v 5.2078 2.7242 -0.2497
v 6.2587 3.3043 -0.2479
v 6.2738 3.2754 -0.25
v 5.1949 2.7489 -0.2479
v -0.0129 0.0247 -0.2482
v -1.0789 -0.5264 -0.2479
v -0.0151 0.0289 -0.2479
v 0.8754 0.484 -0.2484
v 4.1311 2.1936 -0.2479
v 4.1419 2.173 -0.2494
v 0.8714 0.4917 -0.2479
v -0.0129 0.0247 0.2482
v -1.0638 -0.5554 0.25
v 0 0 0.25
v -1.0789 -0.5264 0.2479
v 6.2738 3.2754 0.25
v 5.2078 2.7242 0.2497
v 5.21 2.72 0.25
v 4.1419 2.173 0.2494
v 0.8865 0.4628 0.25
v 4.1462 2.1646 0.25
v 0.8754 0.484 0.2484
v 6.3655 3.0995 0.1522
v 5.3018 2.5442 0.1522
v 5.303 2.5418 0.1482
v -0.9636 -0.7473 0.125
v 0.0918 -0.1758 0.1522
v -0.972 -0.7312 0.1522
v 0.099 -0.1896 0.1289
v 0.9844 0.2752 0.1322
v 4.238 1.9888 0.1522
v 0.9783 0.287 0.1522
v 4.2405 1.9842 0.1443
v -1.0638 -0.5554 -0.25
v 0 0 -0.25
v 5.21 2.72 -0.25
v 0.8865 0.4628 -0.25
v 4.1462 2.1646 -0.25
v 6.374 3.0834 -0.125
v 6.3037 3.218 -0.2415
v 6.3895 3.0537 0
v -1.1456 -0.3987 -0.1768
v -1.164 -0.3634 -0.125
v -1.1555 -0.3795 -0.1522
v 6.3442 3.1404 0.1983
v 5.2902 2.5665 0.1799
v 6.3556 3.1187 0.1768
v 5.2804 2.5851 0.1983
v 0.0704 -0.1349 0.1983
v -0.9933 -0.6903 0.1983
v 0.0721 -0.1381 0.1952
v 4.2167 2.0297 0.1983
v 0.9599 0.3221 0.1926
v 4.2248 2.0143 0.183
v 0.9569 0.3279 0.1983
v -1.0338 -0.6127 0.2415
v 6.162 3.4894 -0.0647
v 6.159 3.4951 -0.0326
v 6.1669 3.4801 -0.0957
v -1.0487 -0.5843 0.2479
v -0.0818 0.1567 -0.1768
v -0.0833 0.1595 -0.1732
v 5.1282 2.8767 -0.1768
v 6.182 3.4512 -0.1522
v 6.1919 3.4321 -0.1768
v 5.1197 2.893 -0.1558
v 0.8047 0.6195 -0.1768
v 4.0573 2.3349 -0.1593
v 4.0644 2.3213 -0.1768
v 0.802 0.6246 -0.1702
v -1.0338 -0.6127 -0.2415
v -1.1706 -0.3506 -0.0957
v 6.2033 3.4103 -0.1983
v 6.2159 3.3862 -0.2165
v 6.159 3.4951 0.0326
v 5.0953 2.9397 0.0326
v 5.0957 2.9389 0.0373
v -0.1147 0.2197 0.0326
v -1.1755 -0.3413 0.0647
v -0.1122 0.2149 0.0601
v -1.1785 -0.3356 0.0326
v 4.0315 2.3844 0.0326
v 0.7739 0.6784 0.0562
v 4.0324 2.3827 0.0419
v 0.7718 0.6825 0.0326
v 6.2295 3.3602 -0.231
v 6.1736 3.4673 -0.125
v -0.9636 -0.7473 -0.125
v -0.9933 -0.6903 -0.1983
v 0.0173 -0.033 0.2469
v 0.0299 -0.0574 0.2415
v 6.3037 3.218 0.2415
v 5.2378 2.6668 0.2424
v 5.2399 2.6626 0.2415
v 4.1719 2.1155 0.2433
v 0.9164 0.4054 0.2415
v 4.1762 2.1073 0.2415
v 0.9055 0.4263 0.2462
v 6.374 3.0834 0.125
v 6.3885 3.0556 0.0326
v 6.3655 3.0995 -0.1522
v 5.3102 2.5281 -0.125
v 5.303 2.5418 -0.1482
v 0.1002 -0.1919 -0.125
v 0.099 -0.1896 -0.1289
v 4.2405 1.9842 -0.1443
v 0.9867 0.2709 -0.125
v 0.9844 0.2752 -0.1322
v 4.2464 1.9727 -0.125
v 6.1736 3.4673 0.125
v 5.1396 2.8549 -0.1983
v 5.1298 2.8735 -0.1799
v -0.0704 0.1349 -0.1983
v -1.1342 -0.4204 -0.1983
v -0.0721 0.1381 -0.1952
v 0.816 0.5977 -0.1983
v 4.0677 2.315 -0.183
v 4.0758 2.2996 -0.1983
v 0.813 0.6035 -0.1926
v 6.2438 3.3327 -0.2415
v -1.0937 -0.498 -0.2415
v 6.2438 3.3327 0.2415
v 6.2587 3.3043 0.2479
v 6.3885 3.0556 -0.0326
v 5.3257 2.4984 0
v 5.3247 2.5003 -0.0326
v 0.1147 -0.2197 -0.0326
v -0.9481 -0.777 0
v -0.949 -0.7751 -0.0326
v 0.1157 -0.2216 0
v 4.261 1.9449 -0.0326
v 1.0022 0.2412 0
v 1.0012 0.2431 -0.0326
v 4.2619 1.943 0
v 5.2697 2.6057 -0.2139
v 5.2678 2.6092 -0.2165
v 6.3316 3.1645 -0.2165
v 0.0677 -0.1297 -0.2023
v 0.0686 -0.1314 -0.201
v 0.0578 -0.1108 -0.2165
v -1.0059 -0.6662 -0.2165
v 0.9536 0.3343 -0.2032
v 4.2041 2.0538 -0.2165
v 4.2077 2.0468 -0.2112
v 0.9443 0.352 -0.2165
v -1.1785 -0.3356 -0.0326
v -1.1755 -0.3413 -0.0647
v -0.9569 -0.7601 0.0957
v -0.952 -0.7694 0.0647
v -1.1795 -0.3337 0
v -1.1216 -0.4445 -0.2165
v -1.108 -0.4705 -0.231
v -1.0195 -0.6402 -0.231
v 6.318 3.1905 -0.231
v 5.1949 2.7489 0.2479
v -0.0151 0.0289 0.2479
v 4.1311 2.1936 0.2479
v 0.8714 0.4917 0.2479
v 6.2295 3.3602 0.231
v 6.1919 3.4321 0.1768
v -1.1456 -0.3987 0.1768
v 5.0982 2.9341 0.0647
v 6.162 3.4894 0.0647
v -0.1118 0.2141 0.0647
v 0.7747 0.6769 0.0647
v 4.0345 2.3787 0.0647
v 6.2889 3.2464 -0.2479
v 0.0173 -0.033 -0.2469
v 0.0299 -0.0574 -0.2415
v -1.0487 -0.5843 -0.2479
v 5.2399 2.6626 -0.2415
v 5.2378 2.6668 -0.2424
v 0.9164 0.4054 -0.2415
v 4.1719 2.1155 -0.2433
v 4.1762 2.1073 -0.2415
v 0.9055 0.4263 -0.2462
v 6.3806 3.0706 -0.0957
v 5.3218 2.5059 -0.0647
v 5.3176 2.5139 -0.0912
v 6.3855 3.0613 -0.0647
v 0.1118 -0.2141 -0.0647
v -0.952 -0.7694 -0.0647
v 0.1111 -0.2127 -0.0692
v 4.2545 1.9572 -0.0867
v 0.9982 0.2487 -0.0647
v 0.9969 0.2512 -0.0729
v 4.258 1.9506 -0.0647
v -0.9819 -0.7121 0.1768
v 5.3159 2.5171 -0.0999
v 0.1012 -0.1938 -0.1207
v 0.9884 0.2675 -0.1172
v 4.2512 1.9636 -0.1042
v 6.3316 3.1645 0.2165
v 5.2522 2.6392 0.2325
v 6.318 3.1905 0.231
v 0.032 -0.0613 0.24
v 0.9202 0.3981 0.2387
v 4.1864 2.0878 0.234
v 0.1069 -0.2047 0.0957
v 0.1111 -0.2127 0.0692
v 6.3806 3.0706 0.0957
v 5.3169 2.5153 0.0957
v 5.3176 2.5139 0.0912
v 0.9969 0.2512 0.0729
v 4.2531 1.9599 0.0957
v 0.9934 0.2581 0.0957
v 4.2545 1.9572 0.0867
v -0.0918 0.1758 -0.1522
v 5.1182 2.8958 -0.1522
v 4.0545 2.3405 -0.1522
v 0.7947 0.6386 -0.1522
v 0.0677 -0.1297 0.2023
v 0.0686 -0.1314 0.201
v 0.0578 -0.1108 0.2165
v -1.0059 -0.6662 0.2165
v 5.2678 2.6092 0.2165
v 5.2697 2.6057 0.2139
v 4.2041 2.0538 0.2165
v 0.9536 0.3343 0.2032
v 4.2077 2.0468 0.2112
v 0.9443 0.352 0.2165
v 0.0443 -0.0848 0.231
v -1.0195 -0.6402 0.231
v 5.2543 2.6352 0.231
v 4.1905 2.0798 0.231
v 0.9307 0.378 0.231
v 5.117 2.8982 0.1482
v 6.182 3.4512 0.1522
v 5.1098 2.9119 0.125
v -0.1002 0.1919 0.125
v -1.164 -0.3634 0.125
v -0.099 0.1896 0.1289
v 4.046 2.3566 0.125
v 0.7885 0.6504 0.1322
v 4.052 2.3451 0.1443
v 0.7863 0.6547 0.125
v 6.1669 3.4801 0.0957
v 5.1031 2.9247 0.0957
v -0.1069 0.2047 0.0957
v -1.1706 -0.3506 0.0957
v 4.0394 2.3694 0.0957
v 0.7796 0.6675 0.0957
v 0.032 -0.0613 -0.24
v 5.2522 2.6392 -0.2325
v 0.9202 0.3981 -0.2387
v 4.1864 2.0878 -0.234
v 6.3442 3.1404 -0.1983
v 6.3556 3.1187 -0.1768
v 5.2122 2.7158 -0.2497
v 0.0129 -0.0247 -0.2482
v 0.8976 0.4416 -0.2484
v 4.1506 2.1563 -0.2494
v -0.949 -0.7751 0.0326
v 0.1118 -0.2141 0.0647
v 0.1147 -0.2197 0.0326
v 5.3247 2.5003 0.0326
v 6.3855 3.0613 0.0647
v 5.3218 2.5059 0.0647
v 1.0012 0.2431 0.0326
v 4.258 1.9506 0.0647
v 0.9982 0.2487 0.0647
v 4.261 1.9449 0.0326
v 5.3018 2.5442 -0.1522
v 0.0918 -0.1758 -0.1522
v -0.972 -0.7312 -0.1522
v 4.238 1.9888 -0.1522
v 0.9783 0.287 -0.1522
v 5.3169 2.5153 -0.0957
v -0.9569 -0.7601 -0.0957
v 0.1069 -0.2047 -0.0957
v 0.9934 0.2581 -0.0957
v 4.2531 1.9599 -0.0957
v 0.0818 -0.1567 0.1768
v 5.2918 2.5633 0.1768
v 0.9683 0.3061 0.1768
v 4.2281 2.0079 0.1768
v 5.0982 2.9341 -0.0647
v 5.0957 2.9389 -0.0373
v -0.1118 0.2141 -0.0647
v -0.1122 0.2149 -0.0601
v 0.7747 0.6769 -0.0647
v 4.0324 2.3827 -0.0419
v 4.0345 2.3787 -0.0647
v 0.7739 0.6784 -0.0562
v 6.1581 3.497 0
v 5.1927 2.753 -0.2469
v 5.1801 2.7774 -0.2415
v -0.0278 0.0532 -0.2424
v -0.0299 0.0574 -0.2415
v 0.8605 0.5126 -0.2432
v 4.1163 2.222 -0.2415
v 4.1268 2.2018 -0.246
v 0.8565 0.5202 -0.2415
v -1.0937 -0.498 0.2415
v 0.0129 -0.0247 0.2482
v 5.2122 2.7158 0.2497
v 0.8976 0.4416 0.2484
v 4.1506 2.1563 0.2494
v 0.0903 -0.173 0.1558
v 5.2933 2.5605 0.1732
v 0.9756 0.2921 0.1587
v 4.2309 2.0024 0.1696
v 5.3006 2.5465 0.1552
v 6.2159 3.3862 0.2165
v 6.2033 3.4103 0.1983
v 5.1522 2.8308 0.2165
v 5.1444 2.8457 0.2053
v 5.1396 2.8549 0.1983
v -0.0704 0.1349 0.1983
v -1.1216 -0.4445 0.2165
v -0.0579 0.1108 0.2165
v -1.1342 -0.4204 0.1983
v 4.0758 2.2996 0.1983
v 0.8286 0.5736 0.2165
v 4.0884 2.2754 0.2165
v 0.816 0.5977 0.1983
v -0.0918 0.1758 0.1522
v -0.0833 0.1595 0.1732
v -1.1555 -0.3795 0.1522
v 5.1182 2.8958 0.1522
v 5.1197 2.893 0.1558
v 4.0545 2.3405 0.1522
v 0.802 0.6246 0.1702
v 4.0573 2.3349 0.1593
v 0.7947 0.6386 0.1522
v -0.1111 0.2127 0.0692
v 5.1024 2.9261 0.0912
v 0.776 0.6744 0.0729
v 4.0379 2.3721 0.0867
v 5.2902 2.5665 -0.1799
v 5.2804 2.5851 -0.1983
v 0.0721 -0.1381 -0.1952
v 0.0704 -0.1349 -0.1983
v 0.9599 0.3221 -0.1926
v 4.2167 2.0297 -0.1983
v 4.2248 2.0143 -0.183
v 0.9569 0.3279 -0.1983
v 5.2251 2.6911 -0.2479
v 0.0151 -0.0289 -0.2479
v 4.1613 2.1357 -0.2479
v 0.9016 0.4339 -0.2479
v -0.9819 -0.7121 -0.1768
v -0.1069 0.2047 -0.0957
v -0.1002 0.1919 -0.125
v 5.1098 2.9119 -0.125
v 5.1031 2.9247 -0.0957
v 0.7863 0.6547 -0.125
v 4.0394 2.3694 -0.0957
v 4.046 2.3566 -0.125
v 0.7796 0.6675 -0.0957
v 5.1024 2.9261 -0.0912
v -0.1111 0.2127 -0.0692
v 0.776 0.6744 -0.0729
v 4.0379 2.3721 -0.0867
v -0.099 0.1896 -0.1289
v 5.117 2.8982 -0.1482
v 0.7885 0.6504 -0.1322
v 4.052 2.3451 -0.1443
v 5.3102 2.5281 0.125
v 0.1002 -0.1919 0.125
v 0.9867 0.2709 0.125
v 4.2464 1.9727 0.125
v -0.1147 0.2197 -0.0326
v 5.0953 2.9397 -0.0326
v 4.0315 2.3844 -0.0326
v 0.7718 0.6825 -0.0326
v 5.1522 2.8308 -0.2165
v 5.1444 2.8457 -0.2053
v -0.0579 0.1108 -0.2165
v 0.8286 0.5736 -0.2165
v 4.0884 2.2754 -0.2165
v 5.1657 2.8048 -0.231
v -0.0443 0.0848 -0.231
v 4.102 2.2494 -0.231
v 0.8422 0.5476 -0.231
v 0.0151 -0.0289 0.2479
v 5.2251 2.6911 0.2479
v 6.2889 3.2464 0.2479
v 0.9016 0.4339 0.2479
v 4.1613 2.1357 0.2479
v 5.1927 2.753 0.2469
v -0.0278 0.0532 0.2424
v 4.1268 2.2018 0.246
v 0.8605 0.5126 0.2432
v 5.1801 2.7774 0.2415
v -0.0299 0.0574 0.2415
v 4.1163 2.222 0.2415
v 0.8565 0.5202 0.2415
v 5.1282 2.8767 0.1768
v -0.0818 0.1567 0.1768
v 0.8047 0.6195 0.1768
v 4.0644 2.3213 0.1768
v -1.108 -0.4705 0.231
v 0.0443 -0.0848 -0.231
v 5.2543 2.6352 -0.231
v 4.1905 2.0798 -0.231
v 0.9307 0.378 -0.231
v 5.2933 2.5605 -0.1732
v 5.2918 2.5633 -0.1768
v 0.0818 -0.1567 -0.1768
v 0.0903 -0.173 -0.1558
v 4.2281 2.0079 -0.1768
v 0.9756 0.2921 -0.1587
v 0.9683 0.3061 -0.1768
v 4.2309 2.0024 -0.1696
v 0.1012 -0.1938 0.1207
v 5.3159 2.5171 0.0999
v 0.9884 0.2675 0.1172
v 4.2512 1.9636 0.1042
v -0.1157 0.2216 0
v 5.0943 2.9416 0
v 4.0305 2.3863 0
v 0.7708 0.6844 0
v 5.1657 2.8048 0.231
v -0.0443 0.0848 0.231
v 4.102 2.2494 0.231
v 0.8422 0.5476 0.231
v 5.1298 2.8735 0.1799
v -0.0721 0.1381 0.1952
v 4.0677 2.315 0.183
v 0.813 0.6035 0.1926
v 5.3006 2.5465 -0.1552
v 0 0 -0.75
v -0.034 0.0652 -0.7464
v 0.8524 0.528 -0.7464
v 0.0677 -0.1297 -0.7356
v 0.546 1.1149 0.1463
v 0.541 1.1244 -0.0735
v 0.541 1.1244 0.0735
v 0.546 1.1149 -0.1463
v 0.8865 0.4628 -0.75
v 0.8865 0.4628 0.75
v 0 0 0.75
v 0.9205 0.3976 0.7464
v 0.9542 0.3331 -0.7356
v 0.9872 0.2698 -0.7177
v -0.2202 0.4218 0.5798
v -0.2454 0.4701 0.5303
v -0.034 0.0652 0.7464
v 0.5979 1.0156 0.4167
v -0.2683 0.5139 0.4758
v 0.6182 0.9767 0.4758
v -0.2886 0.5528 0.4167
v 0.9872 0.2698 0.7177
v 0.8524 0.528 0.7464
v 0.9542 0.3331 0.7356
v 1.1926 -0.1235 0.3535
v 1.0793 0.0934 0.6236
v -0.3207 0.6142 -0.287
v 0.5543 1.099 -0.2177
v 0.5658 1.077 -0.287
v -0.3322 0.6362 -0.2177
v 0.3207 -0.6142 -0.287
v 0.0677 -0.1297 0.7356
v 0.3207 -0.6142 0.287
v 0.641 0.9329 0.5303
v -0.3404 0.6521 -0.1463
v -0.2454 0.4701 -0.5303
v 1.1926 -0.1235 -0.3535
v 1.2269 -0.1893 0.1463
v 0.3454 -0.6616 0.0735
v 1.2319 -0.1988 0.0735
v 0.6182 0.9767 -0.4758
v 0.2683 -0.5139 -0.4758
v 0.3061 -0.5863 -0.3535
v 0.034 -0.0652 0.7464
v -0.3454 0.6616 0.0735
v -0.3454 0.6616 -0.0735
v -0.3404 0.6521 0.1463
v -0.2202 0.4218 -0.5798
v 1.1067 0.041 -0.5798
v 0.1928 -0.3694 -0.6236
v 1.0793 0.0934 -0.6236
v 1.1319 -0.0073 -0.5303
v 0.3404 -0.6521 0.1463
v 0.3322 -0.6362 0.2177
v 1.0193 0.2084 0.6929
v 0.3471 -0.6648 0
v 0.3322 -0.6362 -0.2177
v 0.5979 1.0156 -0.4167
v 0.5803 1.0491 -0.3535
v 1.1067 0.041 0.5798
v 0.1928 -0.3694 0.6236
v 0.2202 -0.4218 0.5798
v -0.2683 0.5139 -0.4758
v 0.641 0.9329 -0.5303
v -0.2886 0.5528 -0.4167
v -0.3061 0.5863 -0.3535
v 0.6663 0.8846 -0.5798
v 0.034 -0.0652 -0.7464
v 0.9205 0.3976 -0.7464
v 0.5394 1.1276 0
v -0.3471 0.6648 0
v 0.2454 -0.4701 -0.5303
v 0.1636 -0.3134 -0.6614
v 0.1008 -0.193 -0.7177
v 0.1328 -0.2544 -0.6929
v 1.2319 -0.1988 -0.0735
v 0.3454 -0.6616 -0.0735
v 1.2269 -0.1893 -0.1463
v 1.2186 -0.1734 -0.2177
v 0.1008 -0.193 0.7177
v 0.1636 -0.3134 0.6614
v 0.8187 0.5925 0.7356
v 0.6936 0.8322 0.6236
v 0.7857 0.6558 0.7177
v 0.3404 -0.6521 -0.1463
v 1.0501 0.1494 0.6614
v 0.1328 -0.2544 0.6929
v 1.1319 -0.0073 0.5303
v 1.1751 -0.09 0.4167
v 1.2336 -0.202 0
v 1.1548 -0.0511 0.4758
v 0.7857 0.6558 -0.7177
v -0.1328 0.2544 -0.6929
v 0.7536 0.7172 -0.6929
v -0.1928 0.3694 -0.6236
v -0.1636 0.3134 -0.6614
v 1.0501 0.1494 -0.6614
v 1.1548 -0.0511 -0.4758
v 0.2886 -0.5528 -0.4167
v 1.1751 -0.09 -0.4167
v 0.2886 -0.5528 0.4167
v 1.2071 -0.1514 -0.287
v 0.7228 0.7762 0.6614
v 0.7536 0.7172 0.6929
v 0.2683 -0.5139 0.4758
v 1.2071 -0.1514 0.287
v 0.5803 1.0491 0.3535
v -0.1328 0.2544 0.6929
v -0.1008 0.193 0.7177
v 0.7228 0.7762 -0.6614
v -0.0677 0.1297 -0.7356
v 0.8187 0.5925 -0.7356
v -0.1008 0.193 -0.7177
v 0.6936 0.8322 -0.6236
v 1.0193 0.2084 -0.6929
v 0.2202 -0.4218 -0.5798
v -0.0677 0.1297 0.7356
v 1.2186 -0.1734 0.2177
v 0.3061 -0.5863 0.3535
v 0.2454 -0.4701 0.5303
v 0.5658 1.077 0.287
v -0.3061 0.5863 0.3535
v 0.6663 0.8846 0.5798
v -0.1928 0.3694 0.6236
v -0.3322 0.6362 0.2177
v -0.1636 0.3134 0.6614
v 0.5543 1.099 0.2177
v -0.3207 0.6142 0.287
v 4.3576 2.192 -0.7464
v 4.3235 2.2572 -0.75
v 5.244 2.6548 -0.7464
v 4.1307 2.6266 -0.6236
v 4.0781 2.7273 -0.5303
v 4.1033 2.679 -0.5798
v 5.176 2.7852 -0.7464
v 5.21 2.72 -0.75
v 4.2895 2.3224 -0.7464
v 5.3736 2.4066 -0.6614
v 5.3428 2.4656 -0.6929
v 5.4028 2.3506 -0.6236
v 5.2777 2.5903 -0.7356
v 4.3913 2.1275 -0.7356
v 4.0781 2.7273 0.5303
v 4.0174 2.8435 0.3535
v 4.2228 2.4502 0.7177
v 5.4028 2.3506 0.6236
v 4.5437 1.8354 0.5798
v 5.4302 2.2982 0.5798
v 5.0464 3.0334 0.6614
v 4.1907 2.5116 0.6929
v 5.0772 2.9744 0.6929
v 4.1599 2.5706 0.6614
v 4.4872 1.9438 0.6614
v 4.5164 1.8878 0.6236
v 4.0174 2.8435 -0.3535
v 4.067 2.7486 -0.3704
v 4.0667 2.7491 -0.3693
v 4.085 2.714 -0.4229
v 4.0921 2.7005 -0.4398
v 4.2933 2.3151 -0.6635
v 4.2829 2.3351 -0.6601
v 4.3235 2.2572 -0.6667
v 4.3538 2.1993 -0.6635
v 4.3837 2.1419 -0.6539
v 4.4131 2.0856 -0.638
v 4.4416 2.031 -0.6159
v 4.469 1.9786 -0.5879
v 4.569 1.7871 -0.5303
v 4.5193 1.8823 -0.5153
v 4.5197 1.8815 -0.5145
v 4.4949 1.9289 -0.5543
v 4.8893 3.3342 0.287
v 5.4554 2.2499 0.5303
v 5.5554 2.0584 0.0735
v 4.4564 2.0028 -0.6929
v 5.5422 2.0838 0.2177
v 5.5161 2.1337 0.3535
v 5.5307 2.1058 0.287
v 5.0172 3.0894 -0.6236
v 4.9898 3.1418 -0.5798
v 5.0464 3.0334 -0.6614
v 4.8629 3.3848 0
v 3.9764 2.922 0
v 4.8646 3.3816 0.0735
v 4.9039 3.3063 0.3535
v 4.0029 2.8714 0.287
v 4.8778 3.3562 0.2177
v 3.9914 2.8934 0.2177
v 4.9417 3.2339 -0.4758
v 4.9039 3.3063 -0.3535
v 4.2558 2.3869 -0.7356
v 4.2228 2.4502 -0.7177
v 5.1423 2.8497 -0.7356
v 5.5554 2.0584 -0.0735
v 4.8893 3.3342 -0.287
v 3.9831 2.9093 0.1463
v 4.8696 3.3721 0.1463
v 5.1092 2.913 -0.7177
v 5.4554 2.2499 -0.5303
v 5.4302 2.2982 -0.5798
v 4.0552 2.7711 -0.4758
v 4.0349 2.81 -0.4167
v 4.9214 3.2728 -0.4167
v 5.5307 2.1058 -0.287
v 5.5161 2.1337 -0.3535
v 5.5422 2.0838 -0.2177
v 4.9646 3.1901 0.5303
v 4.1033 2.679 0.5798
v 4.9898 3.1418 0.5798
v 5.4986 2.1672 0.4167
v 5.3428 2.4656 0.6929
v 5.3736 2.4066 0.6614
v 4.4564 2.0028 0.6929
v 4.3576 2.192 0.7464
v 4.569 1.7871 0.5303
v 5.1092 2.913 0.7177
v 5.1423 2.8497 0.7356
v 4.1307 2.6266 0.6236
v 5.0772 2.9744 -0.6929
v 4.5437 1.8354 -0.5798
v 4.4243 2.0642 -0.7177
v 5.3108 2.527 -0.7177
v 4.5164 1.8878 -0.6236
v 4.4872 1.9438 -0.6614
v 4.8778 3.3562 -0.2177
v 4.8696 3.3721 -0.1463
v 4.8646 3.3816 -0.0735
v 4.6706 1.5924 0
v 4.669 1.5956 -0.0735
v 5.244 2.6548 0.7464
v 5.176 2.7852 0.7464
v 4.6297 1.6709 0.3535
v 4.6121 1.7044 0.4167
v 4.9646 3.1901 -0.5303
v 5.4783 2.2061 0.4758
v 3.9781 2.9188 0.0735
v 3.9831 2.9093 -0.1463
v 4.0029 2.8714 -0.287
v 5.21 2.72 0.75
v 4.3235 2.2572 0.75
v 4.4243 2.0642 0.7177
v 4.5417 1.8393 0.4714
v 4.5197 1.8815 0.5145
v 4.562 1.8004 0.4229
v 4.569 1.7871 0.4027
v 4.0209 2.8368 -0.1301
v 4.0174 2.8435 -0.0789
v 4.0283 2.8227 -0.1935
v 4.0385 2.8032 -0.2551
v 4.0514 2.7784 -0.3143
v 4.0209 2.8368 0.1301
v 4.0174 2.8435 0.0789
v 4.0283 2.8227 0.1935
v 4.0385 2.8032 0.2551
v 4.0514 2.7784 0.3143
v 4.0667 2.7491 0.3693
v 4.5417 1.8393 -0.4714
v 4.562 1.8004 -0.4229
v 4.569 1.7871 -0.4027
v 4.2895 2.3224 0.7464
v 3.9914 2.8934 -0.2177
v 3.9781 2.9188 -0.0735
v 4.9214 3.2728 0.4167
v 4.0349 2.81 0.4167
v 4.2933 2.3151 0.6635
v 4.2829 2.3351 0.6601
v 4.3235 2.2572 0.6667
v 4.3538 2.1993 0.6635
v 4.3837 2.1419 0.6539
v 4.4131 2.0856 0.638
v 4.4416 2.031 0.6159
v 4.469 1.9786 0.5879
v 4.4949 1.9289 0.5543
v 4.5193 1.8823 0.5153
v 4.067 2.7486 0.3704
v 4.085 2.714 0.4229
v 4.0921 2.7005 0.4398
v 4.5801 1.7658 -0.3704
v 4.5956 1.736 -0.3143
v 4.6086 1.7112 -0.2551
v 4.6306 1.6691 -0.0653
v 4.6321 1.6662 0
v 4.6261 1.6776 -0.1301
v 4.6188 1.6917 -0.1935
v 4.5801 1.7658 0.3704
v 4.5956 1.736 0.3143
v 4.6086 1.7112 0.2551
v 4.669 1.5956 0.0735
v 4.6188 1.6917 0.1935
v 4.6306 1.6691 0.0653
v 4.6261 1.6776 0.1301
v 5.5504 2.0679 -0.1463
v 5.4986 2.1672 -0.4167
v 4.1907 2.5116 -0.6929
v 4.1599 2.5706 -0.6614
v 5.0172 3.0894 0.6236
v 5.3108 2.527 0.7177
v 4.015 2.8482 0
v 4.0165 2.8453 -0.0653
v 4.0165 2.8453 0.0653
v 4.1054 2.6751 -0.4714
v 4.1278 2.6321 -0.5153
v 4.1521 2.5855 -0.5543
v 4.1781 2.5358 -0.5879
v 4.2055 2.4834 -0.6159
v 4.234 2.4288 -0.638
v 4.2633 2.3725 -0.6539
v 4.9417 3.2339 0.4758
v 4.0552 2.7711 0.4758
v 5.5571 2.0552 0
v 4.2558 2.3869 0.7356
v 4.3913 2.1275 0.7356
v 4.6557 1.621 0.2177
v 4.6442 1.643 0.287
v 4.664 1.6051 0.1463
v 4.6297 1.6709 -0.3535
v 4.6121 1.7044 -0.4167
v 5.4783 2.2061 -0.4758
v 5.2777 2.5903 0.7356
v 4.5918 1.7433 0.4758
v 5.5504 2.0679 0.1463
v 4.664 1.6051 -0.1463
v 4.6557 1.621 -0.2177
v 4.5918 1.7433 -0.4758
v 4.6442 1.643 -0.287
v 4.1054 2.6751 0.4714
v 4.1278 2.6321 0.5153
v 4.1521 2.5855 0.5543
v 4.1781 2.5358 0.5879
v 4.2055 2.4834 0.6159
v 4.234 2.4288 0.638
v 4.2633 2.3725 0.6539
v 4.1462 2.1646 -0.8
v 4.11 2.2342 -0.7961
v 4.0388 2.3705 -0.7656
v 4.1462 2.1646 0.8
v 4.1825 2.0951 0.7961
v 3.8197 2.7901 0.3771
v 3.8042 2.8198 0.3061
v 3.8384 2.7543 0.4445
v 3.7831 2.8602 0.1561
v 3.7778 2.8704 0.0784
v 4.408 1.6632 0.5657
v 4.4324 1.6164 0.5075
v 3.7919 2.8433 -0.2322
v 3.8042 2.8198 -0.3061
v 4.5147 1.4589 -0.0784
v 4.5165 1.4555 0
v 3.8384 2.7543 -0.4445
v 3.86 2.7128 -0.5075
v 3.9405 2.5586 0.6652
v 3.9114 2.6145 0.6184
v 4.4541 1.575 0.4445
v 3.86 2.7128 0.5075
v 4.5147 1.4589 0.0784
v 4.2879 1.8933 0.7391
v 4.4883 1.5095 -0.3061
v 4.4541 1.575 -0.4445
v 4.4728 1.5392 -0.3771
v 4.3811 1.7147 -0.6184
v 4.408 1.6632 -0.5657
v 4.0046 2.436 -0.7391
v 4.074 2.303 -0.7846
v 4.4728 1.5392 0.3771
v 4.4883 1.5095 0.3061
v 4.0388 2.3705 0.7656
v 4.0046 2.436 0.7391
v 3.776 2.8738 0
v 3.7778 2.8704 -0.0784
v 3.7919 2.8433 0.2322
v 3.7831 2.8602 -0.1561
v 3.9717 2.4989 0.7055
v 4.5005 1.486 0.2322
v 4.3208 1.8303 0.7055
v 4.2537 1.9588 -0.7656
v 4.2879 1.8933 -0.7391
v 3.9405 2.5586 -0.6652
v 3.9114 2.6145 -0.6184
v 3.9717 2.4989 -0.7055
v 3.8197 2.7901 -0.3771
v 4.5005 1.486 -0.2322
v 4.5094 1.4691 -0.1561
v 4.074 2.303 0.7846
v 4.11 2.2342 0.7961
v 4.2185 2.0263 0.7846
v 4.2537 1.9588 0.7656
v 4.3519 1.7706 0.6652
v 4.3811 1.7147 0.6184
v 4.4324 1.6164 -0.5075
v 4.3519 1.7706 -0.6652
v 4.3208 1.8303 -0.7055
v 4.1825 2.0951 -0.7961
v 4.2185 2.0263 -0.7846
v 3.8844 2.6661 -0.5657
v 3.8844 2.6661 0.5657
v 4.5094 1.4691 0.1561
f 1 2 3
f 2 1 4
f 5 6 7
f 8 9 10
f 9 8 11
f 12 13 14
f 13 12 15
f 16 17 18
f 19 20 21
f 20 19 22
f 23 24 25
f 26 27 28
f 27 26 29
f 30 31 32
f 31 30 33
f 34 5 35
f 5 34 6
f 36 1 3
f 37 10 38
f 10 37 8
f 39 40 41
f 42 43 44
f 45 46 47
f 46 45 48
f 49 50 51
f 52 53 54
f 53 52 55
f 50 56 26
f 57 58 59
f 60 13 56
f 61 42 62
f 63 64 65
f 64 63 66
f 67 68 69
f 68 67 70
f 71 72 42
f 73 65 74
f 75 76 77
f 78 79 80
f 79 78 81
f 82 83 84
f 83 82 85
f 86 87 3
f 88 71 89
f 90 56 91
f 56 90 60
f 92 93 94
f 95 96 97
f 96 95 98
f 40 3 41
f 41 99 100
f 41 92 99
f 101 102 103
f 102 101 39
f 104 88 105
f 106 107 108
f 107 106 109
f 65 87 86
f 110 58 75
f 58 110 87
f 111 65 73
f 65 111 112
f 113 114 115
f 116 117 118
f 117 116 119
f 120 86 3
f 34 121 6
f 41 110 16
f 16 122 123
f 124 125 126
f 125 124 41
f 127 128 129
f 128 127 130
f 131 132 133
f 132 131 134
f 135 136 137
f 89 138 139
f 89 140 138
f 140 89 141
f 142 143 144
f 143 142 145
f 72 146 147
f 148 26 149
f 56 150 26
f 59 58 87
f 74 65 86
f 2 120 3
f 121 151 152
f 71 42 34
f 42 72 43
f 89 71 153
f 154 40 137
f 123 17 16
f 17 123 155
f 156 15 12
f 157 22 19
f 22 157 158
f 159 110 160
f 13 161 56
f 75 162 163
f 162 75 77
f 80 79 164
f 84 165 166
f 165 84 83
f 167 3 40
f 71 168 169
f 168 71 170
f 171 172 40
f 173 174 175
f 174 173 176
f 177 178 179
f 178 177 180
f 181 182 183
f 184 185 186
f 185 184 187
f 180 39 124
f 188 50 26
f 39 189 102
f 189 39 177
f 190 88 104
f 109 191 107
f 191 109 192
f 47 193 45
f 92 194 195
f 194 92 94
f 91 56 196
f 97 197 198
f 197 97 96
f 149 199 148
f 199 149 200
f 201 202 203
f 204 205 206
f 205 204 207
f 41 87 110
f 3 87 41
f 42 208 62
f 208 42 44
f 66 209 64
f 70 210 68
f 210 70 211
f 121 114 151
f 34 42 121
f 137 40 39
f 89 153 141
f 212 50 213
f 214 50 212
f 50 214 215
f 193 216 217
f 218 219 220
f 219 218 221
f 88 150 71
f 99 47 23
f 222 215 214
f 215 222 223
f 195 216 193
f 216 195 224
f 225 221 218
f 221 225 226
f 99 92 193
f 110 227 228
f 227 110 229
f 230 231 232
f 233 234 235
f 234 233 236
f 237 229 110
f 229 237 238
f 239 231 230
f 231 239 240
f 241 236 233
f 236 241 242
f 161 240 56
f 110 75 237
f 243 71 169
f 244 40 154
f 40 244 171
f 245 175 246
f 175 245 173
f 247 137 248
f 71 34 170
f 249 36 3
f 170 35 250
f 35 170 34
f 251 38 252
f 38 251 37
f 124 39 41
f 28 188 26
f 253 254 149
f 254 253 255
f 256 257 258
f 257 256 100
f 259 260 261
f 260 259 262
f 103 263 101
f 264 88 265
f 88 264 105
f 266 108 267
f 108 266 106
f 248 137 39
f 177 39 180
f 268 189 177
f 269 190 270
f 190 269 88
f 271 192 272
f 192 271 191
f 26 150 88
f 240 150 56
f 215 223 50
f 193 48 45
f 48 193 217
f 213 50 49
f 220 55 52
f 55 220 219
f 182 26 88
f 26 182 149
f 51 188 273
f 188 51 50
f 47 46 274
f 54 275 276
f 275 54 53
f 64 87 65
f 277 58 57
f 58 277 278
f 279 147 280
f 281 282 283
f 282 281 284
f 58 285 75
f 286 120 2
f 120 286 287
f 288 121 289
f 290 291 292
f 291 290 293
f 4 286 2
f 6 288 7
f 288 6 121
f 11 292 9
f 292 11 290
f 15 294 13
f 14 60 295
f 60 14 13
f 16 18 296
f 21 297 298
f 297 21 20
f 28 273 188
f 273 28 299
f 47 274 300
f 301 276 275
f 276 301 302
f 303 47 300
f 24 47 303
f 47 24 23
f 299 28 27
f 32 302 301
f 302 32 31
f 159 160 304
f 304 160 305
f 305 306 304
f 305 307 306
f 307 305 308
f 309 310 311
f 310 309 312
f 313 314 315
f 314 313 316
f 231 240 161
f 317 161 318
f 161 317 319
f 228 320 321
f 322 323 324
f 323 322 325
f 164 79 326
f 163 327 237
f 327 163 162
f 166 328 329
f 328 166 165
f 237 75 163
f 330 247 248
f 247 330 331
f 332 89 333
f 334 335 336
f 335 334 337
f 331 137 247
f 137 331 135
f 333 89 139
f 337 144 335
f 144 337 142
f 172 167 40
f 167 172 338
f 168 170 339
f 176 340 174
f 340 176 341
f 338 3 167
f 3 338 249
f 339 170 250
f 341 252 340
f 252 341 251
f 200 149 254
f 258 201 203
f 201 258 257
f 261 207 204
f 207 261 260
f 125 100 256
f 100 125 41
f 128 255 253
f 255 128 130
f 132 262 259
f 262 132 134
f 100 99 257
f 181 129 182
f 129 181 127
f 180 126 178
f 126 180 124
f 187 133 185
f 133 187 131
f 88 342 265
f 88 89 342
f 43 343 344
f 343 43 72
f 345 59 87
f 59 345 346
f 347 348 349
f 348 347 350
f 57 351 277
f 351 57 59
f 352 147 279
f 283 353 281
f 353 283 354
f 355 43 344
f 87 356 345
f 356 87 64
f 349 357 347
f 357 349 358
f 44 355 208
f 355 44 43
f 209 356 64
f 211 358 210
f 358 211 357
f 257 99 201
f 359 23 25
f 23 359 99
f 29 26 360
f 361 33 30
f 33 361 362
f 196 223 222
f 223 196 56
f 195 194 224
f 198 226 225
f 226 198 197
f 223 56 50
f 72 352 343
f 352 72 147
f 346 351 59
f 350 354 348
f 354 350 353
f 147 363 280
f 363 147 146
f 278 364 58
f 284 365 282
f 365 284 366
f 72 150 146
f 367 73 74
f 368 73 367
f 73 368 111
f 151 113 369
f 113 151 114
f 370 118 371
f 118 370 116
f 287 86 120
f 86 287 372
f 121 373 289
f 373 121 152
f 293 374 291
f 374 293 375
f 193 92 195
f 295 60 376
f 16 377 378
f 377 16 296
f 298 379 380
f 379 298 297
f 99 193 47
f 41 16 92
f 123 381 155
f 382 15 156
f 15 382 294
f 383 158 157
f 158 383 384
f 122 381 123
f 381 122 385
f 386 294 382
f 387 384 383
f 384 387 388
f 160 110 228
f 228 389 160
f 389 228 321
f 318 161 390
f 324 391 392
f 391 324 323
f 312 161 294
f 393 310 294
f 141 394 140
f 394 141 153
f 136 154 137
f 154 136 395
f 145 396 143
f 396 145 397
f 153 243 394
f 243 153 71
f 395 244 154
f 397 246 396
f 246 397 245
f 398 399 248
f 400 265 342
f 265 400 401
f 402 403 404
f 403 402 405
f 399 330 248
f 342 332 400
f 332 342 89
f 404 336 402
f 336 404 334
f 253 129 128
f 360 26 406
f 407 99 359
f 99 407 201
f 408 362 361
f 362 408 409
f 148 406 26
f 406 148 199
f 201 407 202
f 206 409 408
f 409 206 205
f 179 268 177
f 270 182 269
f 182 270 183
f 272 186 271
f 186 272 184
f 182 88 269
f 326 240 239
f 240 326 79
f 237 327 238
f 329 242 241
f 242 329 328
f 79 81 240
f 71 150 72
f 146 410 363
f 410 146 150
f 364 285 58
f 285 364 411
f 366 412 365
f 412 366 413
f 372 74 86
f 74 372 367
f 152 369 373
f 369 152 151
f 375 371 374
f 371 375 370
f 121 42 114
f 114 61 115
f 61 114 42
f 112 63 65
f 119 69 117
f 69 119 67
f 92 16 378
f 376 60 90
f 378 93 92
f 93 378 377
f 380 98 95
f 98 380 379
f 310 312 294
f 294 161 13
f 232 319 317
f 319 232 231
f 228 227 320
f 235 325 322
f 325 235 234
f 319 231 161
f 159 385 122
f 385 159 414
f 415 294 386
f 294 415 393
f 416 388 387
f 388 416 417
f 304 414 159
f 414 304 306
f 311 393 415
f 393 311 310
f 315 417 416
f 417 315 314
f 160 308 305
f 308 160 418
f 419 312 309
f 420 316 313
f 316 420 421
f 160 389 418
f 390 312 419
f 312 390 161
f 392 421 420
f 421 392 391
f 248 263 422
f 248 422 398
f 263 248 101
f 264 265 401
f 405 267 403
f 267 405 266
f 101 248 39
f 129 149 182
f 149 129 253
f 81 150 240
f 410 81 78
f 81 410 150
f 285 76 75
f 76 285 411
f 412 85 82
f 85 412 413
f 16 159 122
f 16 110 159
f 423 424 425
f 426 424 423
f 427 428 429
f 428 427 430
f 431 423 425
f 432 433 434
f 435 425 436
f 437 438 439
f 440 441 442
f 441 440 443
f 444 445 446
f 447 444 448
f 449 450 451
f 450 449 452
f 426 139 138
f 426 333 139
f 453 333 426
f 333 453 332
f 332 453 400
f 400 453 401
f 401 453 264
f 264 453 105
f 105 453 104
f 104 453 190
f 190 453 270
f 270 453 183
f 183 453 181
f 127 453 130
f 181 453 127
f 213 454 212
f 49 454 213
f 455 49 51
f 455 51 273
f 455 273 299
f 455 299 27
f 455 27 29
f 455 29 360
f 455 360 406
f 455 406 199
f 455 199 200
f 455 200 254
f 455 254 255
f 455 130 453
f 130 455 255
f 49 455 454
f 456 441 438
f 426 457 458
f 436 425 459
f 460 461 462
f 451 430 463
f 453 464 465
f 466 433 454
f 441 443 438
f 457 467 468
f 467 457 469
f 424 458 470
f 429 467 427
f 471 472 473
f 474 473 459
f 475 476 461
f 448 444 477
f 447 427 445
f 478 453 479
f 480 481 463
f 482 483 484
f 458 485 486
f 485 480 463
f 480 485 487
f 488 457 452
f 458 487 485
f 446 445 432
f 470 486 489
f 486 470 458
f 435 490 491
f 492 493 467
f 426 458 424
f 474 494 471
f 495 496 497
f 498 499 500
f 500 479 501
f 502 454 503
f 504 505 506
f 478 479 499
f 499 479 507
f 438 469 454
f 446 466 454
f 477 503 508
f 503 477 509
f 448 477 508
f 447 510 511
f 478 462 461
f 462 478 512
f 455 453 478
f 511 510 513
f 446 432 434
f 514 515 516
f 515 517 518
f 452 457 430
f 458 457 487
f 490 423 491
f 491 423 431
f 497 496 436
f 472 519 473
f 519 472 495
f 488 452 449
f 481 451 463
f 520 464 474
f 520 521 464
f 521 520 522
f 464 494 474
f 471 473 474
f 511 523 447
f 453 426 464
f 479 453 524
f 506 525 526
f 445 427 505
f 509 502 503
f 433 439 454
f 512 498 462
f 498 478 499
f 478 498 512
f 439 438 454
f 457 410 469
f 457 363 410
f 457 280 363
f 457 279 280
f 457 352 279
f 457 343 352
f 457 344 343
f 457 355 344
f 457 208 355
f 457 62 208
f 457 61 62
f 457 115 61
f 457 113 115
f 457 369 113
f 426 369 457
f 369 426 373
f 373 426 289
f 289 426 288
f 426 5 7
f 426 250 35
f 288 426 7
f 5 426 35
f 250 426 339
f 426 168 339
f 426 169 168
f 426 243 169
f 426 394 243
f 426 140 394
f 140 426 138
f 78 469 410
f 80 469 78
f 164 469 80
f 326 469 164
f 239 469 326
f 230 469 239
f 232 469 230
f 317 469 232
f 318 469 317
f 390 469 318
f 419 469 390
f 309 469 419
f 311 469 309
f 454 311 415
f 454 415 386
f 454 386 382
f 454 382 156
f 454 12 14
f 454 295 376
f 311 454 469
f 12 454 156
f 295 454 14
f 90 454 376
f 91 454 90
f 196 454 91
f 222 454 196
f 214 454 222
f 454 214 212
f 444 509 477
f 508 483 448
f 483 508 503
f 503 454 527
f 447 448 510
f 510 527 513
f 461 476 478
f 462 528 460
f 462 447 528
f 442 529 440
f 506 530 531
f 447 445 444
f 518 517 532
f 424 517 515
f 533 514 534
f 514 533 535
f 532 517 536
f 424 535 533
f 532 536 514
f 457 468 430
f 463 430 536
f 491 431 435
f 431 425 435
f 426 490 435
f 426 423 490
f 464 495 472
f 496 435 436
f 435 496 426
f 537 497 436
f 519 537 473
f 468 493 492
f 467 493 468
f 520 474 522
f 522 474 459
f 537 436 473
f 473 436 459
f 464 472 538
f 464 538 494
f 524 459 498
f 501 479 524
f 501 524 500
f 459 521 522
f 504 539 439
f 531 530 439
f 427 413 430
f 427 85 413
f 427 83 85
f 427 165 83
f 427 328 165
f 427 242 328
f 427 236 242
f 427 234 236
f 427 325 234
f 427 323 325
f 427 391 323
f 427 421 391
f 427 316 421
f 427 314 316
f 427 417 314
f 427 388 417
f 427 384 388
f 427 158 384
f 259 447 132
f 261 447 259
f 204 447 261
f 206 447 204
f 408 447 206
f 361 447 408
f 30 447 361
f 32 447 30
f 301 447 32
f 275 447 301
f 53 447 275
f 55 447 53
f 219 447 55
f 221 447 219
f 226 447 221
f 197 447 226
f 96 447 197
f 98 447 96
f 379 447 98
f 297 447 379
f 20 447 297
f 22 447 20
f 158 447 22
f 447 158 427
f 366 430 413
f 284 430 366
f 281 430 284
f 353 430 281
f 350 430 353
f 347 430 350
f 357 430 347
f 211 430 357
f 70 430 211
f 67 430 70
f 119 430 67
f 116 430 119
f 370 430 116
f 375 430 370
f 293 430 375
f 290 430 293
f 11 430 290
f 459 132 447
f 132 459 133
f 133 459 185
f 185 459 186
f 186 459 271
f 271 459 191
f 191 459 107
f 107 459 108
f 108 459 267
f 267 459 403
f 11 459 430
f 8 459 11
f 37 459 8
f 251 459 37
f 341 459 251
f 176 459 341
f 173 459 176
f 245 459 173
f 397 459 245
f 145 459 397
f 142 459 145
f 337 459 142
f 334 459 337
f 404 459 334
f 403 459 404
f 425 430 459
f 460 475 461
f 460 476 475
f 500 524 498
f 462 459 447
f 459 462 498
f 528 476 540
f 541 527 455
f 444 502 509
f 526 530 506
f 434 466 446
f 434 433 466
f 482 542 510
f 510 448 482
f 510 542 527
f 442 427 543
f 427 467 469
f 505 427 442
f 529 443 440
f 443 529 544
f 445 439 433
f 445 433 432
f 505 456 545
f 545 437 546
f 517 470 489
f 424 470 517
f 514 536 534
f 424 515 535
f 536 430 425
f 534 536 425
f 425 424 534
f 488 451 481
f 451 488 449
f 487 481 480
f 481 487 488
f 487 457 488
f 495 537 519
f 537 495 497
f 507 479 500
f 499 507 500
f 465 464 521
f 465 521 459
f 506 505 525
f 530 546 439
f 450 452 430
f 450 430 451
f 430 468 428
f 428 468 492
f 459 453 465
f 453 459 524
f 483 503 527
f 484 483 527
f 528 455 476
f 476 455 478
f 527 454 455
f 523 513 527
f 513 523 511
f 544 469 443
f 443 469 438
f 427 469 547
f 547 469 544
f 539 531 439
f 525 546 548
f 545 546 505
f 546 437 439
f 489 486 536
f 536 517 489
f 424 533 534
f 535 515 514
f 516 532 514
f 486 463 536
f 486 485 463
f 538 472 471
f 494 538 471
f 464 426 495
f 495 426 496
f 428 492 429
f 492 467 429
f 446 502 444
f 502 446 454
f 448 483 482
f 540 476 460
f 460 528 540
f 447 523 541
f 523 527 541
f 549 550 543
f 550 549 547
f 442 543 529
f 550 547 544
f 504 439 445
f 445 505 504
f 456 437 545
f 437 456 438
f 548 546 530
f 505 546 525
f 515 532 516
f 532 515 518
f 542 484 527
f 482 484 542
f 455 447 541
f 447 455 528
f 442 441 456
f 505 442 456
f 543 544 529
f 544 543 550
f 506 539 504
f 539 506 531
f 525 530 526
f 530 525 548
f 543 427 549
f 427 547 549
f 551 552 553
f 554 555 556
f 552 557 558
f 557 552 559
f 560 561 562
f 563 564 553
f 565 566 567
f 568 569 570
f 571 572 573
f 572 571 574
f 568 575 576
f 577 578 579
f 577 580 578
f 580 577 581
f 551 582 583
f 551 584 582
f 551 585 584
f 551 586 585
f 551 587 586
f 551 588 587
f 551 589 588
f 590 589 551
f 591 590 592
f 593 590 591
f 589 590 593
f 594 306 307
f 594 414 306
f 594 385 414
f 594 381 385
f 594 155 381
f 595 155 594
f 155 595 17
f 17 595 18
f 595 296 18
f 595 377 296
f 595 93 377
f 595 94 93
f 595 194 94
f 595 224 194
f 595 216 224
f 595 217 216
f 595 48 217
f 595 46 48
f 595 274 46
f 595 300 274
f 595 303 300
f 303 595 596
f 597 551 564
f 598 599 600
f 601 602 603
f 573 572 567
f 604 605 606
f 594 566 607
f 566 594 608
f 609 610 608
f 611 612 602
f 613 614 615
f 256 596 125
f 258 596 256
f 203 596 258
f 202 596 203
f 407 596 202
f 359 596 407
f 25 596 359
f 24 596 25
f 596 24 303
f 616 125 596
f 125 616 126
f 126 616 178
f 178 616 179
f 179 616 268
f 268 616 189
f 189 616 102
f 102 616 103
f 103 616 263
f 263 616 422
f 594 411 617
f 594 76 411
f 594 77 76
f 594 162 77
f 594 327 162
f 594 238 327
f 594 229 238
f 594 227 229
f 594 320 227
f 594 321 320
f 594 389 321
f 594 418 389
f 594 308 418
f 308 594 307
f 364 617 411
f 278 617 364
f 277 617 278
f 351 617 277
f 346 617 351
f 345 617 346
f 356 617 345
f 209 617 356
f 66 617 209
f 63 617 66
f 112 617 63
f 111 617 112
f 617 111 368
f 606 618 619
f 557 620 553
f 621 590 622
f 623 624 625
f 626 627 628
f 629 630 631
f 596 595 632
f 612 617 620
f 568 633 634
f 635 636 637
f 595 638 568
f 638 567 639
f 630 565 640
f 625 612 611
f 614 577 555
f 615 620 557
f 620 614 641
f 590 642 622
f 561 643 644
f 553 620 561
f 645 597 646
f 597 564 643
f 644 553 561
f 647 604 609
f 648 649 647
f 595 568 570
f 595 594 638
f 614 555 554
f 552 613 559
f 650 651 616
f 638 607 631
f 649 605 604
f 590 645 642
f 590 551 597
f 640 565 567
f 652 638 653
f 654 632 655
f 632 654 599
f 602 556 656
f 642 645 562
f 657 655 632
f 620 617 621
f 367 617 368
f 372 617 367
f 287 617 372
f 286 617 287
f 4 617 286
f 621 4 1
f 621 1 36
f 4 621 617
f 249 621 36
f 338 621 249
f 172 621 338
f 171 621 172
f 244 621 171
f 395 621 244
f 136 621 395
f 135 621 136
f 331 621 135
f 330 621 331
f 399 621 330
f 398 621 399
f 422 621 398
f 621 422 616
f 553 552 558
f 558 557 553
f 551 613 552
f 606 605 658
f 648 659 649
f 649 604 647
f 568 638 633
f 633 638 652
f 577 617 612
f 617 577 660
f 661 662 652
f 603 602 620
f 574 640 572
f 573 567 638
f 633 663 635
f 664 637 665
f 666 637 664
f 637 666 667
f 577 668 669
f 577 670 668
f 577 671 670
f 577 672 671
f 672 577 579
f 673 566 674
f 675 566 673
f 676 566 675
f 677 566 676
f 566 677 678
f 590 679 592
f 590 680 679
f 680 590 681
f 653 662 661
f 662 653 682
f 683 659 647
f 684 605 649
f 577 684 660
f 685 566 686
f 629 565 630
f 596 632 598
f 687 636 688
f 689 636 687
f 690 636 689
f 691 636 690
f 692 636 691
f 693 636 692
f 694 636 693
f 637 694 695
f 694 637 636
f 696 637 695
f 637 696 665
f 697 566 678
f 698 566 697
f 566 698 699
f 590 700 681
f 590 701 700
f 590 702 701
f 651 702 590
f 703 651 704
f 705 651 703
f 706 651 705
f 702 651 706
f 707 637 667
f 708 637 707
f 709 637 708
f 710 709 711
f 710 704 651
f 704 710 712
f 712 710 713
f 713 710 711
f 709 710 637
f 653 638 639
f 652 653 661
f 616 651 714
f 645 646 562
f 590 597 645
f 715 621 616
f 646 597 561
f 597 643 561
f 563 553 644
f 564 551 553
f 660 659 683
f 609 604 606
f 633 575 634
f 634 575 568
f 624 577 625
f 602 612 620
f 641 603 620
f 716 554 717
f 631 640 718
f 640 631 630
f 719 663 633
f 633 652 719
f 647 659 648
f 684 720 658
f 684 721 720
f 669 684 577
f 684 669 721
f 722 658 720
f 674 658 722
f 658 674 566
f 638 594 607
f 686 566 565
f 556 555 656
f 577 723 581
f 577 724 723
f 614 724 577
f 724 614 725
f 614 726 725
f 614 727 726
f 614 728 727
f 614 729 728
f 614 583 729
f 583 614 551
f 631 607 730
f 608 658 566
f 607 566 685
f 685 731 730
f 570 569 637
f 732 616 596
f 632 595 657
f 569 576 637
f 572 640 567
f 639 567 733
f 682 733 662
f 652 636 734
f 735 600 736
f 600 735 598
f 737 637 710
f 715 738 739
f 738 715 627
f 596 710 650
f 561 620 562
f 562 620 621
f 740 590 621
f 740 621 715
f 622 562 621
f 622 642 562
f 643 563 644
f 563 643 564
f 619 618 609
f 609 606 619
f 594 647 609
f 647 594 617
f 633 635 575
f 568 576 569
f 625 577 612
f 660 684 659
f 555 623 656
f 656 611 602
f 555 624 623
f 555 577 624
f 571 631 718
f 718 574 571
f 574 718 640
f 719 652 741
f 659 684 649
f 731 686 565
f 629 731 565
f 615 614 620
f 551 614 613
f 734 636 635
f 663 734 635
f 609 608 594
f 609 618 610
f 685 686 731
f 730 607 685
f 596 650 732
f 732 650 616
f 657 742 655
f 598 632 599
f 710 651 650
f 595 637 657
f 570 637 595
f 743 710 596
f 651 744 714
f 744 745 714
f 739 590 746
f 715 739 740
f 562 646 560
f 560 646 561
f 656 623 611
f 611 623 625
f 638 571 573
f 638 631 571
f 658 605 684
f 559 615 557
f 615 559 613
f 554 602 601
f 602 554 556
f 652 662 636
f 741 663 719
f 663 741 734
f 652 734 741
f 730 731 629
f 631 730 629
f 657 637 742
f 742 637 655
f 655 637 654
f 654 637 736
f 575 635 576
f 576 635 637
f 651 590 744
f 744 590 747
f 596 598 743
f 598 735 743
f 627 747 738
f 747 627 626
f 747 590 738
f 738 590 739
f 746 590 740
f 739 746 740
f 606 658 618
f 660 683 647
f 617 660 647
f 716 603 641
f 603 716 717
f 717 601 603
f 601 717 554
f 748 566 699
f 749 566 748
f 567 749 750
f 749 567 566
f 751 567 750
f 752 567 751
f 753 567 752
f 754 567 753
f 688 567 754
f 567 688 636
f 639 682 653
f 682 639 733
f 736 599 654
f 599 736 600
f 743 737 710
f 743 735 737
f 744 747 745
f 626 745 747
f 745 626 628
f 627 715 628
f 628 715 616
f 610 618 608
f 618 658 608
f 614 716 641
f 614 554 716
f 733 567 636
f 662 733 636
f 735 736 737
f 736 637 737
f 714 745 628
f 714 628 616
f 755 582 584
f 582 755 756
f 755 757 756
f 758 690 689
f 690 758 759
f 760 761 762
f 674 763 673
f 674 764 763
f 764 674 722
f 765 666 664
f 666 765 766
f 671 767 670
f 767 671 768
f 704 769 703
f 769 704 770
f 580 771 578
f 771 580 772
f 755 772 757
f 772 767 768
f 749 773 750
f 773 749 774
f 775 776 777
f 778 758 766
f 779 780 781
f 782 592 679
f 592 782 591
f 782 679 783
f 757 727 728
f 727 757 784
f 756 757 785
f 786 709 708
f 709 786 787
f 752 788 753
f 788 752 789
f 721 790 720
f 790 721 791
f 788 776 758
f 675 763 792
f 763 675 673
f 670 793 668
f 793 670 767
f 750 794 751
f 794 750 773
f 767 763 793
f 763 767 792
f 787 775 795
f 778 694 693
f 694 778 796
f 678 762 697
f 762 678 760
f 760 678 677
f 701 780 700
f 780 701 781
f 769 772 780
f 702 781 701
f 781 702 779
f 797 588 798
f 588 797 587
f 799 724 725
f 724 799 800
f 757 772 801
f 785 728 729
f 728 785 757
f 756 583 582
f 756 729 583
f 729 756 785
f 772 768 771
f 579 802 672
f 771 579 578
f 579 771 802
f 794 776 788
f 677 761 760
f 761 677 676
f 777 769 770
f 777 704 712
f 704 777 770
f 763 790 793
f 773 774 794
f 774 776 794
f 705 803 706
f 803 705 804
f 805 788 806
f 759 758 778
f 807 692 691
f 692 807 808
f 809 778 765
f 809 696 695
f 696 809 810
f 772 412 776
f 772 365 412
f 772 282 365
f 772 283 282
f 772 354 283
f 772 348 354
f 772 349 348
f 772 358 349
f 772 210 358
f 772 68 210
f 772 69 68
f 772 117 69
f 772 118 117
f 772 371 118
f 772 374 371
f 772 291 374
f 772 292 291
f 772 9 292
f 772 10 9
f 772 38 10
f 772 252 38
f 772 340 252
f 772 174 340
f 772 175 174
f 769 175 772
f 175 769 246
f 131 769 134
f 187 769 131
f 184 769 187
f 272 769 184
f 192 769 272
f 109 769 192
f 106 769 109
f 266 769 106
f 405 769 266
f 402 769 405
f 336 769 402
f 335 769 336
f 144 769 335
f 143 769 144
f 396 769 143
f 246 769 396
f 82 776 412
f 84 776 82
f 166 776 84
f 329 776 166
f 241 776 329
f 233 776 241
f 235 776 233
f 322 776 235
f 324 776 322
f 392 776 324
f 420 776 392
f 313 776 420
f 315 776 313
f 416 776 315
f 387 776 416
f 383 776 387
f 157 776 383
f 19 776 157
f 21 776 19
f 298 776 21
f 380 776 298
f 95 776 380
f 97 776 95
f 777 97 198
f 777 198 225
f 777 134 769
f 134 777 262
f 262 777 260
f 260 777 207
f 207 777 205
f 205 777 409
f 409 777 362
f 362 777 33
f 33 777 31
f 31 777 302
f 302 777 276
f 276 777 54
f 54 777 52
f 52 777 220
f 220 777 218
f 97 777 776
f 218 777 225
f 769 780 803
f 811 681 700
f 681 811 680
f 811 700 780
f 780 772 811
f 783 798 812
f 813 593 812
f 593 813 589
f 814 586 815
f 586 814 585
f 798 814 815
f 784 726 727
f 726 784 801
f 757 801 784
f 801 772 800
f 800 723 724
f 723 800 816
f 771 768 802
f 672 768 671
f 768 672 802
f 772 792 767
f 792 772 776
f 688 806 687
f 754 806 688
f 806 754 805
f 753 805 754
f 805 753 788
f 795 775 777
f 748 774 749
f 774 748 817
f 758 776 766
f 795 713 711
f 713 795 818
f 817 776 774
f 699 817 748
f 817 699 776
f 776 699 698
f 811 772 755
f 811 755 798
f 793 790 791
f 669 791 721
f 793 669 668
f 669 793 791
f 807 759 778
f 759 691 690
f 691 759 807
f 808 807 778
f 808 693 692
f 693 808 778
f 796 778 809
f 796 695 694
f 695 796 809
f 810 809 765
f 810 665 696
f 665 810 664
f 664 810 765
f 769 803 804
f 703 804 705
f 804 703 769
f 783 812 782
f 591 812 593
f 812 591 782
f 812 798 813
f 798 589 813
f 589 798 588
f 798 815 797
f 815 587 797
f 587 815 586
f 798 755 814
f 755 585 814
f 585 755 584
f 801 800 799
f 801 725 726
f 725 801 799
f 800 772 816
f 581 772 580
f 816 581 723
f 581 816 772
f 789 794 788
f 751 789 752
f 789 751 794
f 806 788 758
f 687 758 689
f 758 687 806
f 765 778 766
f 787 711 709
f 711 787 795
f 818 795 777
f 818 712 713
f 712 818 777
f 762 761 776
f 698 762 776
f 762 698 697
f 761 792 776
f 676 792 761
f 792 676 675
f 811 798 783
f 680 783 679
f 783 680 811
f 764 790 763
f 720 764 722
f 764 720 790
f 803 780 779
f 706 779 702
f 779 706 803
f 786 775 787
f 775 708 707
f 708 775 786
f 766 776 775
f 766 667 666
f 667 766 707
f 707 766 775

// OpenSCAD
// Parameters
axial_x = 5.21; //[2.605:10.42:0.01]
axial_y = 2.72; //[1.36:5.44:0.01]
axial_z = 0;    //[−5:5:0.01]

line_diameter = 0.5; //[0.25:1:0.05]
endpoint_marker_diameter = 1.5; //[0.75:3:0.05]
endpoint_marker_height = 1; //[0.5:2:0.05]
origin_marker_diameter = 1.5; //[0.75:3:0.05]
origin_marker_height = 1; //[0.5:2:0.05]
arrowhead_length = 1.2; //[0.6:2.4:0.05]
arrowhead_diameter = 1.6; //[0.8:3.2:0.05]

// Overlap for solid connections (1–2mm requested)
connect_overlap = 1.2; //[0.2:2:0.05]

// Calculate the length of the axial vector
axial_length = sqrt(axial_x*axial_x + axial_y*axial_y + axial_z*axial_z);

// Helper: rotate Z so a cylinder aligned with +Z points along the axial vector in XY plane
function axial_angle_deg(x,y) = atan2(y, x);

// Axial reference indicator (single connected, clearly axial/axisymmetric)
module axial_reference_indicator() {
  // Derived sizes/positions to guarantee contact
  r_line = line_diameter/2;
  r_origin = origin_marker_diameter/2;
  r_end = endpoint_marker_diameter/2;

  // Make the "shaft" run from origin to endpoint with slight extension into both end features
  shaft_len = axial_length + 2*connect_overlap;

  // Place origin marker so its top face overlaps the shaft start
  // (origin marker centered at z = origin_h/2, shaft centered at z = shaft_len/2)
  origin_z = origin_marker_height/2;

  // Place endpoint marker so its bottom face overlaps the shaft end
  end_z = axial_length - endpoint_marker_height/2;

  // Place arrowhead so its base overlaps the endpoint marker/shaft region
  // (arrowhead centered so its base is slightly inside the endpoint marker)
  arrow_z = axial_length + arrowhead_length/2 - connect_overlap;

  union() {
    // Main axial shaft (axisymmetric, single body backbone)
    rotate([0, 90, axial_angle_deg(axial_x, axial_y)])
      translate([0, 0, axial_length/2])
        cylinder(h=shaft_len, r=r_line, center=true, $fn=48);

    // Origin marker (coaxial with shaft)
    rotate([0, 90, axial_angle_deg(axial_x, axial_y)])
      translate([0, 0, origin_z])
        cylinder(h=origin_marker_height, r=r_origin, center=true, $fn=64);

    // Endpoint marker (coaxial with shaft)
    rotate([0, 90, axial_angle_deg(axial_x, axial_y)])
      translate([0, 0, end_z])
        cylinder(h=endpoint_marker_height, r=r_end, center=true, $fn=64);

    // Arrowhead (coaxial with shaft, pointing outward)
    rotate([0, 90, axial_angle_deg(axial_x, axial_y)])
      translate([0, 0, arrow_z])
        cylinder(h=arrowhead_length, r1=arrowhead_diameter/2, r2=0, center=true, $fn=64);
  }
}

// Render the model
axial_reference_indicator();
